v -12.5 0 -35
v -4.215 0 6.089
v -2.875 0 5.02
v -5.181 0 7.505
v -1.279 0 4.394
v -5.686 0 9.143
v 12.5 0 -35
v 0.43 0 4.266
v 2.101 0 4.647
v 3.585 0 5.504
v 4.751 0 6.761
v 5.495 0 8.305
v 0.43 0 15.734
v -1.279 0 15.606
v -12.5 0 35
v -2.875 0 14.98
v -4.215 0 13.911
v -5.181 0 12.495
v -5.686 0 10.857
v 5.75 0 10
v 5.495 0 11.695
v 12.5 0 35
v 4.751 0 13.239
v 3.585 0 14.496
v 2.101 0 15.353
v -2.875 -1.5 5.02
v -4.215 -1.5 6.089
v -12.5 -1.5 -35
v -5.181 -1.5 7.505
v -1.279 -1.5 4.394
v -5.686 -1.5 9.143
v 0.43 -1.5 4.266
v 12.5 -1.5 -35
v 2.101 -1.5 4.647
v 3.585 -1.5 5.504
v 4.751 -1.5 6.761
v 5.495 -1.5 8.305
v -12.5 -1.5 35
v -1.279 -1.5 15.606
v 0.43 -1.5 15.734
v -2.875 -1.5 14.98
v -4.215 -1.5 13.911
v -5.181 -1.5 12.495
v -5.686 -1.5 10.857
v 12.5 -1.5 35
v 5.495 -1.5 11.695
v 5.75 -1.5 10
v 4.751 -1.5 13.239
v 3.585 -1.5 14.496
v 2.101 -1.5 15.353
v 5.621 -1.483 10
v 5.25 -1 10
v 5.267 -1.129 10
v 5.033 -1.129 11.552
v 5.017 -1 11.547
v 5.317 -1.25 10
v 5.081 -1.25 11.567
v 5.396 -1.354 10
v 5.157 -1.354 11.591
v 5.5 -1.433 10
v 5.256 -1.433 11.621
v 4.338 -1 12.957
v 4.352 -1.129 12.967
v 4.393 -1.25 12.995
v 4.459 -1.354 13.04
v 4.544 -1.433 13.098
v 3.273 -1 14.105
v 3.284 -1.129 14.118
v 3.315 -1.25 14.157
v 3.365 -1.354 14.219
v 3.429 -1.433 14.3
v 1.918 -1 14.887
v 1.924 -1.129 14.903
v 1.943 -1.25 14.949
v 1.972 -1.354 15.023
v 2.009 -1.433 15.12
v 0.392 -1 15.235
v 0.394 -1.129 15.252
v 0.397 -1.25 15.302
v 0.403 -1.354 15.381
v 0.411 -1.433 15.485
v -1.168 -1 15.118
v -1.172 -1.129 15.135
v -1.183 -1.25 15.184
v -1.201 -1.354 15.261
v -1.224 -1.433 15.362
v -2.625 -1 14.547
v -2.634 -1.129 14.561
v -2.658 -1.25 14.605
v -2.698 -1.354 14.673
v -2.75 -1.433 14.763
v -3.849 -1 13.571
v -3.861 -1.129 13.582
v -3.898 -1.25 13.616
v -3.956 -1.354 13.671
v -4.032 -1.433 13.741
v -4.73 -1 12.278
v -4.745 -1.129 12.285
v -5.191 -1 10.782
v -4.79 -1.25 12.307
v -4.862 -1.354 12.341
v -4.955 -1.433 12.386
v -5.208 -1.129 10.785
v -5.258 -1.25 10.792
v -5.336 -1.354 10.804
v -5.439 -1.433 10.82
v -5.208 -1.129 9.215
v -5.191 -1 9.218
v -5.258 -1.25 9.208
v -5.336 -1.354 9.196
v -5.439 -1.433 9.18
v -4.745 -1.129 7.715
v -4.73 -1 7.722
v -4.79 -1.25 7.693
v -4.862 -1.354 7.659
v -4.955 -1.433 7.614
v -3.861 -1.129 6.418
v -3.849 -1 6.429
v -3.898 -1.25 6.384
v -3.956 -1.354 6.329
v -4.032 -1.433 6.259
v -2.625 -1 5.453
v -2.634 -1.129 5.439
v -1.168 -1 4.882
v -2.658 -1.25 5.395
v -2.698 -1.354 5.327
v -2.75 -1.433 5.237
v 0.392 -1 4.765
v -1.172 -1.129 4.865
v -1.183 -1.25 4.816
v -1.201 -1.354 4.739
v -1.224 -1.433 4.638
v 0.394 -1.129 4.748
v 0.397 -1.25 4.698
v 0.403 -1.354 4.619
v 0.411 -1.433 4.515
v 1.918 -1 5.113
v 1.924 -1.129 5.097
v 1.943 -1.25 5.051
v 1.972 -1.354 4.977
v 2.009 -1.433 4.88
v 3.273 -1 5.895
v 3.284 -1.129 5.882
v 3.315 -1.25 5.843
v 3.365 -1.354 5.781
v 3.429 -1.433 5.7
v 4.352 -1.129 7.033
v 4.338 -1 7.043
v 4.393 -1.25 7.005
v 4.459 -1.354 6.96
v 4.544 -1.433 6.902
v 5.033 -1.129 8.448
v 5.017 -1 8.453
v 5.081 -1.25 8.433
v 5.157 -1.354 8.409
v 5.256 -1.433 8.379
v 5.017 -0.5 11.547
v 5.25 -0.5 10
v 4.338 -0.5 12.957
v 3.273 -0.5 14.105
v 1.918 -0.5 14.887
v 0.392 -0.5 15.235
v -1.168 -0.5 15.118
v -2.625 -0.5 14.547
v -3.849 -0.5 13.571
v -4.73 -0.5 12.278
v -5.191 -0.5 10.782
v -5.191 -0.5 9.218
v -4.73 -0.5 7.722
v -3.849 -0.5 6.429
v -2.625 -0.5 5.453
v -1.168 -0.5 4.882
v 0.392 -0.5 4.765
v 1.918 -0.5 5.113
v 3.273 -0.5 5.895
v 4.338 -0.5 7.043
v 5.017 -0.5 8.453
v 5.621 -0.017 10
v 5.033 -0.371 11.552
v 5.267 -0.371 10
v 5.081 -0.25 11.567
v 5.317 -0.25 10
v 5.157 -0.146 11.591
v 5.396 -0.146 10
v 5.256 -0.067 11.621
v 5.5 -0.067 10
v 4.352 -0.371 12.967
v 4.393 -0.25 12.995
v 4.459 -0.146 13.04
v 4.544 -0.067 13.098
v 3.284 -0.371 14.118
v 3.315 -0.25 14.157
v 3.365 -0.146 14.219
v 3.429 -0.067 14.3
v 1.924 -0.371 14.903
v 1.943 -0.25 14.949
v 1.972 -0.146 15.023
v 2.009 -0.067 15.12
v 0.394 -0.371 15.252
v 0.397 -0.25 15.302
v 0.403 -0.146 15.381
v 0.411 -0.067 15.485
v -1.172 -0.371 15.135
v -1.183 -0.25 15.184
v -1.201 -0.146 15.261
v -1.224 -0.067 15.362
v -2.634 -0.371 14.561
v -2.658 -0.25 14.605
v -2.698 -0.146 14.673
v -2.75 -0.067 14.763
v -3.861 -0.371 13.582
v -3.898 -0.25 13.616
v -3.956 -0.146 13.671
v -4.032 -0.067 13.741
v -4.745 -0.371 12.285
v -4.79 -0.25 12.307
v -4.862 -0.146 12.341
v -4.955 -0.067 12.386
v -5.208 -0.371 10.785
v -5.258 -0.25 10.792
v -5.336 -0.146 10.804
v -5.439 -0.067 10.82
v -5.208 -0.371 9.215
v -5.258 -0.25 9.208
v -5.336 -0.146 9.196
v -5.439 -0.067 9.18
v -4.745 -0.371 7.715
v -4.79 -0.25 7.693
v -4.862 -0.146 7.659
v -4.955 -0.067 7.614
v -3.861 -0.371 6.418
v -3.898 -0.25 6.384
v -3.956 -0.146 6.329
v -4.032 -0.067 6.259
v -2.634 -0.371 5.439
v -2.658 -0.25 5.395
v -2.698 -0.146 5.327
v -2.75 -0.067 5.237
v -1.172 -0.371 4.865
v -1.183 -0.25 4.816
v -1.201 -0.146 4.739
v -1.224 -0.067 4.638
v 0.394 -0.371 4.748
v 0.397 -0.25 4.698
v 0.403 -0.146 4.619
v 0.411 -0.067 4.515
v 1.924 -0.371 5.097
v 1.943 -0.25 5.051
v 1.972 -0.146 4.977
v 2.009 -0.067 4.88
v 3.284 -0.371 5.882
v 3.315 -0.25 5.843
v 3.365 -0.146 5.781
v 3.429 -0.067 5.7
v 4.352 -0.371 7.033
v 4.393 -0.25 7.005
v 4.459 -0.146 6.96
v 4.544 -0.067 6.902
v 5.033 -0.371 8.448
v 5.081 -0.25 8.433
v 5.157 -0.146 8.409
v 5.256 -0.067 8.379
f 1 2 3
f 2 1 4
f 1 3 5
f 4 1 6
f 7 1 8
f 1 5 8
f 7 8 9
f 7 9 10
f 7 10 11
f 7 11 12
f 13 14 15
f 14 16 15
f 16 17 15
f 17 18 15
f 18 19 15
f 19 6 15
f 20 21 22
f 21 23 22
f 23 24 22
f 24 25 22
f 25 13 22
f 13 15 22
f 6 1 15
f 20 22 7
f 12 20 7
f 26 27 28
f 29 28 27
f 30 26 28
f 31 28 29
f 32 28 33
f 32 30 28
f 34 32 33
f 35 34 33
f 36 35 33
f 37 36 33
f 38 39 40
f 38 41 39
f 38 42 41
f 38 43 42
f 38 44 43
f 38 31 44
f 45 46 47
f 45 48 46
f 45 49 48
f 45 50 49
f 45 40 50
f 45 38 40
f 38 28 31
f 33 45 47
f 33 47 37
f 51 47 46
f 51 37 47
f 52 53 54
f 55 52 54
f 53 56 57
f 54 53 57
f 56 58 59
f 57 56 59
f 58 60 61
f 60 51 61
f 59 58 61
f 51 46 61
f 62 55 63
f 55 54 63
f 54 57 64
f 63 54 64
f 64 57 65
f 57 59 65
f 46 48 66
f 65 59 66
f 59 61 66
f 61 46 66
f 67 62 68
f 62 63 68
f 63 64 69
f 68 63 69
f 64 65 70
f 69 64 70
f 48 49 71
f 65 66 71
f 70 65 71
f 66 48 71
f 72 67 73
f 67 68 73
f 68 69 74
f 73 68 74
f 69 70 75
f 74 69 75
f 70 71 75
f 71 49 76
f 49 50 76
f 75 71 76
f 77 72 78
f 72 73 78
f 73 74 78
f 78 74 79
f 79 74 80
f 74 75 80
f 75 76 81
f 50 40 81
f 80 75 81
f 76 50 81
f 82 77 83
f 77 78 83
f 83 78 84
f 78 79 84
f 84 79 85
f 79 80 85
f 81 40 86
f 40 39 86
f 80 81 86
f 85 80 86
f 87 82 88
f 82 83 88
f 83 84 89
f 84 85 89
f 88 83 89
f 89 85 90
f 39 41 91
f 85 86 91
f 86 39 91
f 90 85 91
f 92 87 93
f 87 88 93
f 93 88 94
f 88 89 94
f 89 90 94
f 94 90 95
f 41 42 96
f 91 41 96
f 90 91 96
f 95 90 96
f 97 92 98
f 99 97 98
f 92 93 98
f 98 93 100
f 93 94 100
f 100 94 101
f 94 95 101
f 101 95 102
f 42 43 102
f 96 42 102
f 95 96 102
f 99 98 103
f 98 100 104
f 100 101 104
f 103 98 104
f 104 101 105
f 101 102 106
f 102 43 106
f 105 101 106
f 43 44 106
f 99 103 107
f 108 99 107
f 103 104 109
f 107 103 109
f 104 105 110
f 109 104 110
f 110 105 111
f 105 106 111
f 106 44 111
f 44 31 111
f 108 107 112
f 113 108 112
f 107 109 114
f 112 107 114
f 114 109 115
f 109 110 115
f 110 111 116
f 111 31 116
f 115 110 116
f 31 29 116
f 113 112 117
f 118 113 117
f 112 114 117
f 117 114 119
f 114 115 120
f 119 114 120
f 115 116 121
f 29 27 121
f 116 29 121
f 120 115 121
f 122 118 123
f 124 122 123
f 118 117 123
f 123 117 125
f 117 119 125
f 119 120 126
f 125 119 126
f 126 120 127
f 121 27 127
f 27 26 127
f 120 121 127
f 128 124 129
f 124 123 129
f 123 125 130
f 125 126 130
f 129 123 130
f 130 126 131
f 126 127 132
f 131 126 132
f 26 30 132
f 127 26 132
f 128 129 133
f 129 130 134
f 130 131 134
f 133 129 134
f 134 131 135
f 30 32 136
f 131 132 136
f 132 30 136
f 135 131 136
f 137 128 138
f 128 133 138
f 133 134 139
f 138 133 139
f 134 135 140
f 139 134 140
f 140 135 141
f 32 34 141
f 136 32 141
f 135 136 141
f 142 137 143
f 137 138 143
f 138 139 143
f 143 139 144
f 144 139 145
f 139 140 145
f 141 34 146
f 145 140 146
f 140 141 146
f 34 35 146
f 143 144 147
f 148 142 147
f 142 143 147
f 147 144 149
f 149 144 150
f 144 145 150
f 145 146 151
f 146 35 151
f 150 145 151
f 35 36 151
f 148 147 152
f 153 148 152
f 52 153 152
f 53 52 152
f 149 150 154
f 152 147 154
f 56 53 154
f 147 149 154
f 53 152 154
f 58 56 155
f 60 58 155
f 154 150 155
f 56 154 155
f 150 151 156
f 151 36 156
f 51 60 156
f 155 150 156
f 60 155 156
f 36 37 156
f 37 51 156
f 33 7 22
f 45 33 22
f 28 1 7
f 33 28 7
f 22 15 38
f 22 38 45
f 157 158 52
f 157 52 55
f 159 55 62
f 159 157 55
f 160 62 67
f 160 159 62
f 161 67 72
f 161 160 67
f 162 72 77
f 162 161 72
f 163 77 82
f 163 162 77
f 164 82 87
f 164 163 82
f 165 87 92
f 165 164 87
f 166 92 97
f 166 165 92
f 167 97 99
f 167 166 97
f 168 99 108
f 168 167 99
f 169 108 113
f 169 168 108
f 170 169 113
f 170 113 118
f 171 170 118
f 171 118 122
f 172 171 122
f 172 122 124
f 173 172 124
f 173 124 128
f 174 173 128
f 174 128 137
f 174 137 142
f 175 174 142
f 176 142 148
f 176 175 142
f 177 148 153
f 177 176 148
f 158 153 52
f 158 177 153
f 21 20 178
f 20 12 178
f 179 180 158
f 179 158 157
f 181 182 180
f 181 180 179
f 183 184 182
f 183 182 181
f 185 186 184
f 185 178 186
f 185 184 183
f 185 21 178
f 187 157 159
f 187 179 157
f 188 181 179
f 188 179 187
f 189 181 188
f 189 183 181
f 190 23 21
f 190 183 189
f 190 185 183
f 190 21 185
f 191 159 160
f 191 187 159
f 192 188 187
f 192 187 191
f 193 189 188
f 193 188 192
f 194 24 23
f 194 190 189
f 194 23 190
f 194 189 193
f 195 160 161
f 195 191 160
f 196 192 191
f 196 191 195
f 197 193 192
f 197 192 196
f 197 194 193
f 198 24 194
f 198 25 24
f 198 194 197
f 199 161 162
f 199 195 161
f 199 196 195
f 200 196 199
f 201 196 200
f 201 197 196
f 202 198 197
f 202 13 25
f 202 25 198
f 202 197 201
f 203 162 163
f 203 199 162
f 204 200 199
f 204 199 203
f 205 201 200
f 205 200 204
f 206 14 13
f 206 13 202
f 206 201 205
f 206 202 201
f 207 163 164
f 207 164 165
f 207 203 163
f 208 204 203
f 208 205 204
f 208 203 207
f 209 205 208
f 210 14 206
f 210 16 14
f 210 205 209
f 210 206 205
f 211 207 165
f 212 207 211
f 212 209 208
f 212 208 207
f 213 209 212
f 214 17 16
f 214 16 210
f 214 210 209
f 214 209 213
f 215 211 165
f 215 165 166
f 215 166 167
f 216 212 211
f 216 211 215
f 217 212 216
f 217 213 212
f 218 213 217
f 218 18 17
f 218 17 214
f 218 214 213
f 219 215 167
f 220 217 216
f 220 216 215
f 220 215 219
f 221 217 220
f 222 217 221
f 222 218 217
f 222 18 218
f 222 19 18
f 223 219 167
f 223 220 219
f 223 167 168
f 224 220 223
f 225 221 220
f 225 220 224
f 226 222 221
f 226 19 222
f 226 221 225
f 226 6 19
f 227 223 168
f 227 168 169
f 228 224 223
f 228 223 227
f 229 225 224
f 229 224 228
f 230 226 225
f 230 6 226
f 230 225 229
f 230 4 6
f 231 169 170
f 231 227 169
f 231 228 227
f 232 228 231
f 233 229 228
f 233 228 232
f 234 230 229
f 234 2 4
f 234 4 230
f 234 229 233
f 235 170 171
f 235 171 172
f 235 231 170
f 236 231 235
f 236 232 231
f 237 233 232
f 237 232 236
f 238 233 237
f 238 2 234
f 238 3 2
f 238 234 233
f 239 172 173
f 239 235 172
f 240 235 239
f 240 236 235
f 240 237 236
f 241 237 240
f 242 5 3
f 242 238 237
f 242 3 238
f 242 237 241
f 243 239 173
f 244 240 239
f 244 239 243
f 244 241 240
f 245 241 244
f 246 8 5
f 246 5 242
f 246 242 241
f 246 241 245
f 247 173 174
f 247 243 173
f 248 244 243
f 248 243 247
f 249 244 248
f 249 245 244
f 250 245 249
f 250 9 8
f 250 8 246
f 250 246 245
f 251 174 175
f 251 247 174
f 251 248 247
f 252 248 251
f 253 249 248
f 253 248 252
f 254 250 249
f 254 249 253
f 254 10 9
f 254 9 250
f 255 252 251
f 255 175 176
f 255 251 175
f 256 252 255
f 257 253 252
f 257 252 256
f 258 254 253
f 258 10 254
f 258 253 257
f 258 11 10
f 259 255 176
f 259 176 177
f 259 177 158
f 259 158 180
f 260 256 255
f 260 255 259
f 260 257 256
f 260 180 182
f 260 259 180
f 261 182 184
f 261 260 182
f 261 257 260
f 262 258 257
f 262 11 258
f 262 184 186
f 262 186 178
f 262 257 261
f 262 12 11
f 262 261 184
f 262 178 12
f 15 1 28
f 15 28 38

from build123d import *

# Parameters (mm, degrees)
F0_W     = 25
F0_H     = 70
F0_R     = 5.25
F1_DEPTH = 1.5
F2_R     = 0.5


with BuildPart() as f1:
    # F0 (on Front) → F1 (new body)
    with BuildSketch(Plane.XZ):
        Rectangle(F0_W, F0_H)
        with Locations((0, 10)):
            Circle(F0_R, mode=Mode.SUBTRACT)
    extrude(amount=F1_DEPTH)

    # F2
    f2_edges = [f1.edges().sort_by_distance(p)[0] for p in [
        (-5.25, 0, 10),
        (-5.25, -1.5, 10),
    ]]
    fillet(f2_edges, radius=F2_R)


solid = f1.part
